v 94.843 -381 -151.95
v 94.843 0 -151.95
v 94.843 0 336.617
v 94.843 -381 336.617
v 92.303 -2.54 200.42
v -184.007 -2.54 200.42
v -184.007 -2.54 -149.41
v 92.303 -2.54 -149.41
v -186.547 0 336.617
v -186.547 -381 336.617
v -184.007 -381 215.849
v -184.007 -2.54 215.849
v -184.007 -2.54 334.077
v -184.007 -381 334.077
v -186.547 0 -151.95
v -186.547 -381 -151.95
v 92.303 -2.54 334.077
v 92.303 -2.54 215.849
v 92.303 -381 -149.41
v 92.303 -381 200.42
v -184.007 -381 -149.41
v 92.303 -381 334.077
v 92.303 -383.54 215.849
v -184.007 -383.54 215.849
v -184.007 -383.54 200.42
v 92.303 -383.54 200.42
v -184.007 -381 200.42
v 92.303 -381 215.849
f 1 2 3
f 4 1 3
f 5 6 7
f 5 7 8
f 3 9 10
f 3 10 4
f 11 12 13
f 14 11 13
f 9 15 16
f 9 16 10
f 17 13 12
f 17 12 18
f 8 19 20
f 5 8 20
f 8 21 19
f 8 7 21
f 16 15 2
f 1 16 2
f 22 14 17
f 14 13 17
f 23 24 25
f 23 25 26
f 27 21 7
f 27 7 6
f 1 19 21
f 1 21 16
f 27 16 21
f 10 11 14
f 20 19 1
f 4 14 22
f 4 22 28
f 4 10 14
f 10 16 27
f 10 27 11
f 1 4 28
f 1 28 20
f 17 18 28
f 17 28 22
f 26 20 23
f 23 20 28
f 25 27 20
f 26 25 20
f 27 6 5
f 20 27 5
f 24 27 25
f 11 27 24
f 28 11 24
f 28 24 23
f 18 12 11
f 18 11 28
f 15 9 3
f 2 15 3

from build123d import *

# Parameters (mm, degrees)
F0_W     = 281.3903391361
F0_H     = 488.5678589344
F1_DEPTH = 381
F2_T     = -2.54
F3_W     = 276.3103391361
F3_H     = 15.4284834862
F4_DEPTH = 381


with BuildPart() as f1:
    # F0 (on Front) → F1 (new body)
    with BuildSketch(Plane.XZ):
        with Locations((-45.8520203829, 92.3334807158)):
            Rectangle(F0_W, F0_H)
    extrude(amount=F1_DEPTH)

    # F2
    f2_openings = [f1.faces().sort_by_distance(p)[0] for p in [
        (-45.85202, -381, 92.333481),
    ]]
    offset(amount=F2_T, openings=f2_openings)

    # F3 (on face) → F4 (join)
    with BuildSketch(Plane.XZ.offset(2.54)):
        with Locations((-45.8520203829, 208.1342786551)):
            Rectangle(F3_W, F3_H)
    extrude(amount=F4_DEPTH)


solid = f1.part
